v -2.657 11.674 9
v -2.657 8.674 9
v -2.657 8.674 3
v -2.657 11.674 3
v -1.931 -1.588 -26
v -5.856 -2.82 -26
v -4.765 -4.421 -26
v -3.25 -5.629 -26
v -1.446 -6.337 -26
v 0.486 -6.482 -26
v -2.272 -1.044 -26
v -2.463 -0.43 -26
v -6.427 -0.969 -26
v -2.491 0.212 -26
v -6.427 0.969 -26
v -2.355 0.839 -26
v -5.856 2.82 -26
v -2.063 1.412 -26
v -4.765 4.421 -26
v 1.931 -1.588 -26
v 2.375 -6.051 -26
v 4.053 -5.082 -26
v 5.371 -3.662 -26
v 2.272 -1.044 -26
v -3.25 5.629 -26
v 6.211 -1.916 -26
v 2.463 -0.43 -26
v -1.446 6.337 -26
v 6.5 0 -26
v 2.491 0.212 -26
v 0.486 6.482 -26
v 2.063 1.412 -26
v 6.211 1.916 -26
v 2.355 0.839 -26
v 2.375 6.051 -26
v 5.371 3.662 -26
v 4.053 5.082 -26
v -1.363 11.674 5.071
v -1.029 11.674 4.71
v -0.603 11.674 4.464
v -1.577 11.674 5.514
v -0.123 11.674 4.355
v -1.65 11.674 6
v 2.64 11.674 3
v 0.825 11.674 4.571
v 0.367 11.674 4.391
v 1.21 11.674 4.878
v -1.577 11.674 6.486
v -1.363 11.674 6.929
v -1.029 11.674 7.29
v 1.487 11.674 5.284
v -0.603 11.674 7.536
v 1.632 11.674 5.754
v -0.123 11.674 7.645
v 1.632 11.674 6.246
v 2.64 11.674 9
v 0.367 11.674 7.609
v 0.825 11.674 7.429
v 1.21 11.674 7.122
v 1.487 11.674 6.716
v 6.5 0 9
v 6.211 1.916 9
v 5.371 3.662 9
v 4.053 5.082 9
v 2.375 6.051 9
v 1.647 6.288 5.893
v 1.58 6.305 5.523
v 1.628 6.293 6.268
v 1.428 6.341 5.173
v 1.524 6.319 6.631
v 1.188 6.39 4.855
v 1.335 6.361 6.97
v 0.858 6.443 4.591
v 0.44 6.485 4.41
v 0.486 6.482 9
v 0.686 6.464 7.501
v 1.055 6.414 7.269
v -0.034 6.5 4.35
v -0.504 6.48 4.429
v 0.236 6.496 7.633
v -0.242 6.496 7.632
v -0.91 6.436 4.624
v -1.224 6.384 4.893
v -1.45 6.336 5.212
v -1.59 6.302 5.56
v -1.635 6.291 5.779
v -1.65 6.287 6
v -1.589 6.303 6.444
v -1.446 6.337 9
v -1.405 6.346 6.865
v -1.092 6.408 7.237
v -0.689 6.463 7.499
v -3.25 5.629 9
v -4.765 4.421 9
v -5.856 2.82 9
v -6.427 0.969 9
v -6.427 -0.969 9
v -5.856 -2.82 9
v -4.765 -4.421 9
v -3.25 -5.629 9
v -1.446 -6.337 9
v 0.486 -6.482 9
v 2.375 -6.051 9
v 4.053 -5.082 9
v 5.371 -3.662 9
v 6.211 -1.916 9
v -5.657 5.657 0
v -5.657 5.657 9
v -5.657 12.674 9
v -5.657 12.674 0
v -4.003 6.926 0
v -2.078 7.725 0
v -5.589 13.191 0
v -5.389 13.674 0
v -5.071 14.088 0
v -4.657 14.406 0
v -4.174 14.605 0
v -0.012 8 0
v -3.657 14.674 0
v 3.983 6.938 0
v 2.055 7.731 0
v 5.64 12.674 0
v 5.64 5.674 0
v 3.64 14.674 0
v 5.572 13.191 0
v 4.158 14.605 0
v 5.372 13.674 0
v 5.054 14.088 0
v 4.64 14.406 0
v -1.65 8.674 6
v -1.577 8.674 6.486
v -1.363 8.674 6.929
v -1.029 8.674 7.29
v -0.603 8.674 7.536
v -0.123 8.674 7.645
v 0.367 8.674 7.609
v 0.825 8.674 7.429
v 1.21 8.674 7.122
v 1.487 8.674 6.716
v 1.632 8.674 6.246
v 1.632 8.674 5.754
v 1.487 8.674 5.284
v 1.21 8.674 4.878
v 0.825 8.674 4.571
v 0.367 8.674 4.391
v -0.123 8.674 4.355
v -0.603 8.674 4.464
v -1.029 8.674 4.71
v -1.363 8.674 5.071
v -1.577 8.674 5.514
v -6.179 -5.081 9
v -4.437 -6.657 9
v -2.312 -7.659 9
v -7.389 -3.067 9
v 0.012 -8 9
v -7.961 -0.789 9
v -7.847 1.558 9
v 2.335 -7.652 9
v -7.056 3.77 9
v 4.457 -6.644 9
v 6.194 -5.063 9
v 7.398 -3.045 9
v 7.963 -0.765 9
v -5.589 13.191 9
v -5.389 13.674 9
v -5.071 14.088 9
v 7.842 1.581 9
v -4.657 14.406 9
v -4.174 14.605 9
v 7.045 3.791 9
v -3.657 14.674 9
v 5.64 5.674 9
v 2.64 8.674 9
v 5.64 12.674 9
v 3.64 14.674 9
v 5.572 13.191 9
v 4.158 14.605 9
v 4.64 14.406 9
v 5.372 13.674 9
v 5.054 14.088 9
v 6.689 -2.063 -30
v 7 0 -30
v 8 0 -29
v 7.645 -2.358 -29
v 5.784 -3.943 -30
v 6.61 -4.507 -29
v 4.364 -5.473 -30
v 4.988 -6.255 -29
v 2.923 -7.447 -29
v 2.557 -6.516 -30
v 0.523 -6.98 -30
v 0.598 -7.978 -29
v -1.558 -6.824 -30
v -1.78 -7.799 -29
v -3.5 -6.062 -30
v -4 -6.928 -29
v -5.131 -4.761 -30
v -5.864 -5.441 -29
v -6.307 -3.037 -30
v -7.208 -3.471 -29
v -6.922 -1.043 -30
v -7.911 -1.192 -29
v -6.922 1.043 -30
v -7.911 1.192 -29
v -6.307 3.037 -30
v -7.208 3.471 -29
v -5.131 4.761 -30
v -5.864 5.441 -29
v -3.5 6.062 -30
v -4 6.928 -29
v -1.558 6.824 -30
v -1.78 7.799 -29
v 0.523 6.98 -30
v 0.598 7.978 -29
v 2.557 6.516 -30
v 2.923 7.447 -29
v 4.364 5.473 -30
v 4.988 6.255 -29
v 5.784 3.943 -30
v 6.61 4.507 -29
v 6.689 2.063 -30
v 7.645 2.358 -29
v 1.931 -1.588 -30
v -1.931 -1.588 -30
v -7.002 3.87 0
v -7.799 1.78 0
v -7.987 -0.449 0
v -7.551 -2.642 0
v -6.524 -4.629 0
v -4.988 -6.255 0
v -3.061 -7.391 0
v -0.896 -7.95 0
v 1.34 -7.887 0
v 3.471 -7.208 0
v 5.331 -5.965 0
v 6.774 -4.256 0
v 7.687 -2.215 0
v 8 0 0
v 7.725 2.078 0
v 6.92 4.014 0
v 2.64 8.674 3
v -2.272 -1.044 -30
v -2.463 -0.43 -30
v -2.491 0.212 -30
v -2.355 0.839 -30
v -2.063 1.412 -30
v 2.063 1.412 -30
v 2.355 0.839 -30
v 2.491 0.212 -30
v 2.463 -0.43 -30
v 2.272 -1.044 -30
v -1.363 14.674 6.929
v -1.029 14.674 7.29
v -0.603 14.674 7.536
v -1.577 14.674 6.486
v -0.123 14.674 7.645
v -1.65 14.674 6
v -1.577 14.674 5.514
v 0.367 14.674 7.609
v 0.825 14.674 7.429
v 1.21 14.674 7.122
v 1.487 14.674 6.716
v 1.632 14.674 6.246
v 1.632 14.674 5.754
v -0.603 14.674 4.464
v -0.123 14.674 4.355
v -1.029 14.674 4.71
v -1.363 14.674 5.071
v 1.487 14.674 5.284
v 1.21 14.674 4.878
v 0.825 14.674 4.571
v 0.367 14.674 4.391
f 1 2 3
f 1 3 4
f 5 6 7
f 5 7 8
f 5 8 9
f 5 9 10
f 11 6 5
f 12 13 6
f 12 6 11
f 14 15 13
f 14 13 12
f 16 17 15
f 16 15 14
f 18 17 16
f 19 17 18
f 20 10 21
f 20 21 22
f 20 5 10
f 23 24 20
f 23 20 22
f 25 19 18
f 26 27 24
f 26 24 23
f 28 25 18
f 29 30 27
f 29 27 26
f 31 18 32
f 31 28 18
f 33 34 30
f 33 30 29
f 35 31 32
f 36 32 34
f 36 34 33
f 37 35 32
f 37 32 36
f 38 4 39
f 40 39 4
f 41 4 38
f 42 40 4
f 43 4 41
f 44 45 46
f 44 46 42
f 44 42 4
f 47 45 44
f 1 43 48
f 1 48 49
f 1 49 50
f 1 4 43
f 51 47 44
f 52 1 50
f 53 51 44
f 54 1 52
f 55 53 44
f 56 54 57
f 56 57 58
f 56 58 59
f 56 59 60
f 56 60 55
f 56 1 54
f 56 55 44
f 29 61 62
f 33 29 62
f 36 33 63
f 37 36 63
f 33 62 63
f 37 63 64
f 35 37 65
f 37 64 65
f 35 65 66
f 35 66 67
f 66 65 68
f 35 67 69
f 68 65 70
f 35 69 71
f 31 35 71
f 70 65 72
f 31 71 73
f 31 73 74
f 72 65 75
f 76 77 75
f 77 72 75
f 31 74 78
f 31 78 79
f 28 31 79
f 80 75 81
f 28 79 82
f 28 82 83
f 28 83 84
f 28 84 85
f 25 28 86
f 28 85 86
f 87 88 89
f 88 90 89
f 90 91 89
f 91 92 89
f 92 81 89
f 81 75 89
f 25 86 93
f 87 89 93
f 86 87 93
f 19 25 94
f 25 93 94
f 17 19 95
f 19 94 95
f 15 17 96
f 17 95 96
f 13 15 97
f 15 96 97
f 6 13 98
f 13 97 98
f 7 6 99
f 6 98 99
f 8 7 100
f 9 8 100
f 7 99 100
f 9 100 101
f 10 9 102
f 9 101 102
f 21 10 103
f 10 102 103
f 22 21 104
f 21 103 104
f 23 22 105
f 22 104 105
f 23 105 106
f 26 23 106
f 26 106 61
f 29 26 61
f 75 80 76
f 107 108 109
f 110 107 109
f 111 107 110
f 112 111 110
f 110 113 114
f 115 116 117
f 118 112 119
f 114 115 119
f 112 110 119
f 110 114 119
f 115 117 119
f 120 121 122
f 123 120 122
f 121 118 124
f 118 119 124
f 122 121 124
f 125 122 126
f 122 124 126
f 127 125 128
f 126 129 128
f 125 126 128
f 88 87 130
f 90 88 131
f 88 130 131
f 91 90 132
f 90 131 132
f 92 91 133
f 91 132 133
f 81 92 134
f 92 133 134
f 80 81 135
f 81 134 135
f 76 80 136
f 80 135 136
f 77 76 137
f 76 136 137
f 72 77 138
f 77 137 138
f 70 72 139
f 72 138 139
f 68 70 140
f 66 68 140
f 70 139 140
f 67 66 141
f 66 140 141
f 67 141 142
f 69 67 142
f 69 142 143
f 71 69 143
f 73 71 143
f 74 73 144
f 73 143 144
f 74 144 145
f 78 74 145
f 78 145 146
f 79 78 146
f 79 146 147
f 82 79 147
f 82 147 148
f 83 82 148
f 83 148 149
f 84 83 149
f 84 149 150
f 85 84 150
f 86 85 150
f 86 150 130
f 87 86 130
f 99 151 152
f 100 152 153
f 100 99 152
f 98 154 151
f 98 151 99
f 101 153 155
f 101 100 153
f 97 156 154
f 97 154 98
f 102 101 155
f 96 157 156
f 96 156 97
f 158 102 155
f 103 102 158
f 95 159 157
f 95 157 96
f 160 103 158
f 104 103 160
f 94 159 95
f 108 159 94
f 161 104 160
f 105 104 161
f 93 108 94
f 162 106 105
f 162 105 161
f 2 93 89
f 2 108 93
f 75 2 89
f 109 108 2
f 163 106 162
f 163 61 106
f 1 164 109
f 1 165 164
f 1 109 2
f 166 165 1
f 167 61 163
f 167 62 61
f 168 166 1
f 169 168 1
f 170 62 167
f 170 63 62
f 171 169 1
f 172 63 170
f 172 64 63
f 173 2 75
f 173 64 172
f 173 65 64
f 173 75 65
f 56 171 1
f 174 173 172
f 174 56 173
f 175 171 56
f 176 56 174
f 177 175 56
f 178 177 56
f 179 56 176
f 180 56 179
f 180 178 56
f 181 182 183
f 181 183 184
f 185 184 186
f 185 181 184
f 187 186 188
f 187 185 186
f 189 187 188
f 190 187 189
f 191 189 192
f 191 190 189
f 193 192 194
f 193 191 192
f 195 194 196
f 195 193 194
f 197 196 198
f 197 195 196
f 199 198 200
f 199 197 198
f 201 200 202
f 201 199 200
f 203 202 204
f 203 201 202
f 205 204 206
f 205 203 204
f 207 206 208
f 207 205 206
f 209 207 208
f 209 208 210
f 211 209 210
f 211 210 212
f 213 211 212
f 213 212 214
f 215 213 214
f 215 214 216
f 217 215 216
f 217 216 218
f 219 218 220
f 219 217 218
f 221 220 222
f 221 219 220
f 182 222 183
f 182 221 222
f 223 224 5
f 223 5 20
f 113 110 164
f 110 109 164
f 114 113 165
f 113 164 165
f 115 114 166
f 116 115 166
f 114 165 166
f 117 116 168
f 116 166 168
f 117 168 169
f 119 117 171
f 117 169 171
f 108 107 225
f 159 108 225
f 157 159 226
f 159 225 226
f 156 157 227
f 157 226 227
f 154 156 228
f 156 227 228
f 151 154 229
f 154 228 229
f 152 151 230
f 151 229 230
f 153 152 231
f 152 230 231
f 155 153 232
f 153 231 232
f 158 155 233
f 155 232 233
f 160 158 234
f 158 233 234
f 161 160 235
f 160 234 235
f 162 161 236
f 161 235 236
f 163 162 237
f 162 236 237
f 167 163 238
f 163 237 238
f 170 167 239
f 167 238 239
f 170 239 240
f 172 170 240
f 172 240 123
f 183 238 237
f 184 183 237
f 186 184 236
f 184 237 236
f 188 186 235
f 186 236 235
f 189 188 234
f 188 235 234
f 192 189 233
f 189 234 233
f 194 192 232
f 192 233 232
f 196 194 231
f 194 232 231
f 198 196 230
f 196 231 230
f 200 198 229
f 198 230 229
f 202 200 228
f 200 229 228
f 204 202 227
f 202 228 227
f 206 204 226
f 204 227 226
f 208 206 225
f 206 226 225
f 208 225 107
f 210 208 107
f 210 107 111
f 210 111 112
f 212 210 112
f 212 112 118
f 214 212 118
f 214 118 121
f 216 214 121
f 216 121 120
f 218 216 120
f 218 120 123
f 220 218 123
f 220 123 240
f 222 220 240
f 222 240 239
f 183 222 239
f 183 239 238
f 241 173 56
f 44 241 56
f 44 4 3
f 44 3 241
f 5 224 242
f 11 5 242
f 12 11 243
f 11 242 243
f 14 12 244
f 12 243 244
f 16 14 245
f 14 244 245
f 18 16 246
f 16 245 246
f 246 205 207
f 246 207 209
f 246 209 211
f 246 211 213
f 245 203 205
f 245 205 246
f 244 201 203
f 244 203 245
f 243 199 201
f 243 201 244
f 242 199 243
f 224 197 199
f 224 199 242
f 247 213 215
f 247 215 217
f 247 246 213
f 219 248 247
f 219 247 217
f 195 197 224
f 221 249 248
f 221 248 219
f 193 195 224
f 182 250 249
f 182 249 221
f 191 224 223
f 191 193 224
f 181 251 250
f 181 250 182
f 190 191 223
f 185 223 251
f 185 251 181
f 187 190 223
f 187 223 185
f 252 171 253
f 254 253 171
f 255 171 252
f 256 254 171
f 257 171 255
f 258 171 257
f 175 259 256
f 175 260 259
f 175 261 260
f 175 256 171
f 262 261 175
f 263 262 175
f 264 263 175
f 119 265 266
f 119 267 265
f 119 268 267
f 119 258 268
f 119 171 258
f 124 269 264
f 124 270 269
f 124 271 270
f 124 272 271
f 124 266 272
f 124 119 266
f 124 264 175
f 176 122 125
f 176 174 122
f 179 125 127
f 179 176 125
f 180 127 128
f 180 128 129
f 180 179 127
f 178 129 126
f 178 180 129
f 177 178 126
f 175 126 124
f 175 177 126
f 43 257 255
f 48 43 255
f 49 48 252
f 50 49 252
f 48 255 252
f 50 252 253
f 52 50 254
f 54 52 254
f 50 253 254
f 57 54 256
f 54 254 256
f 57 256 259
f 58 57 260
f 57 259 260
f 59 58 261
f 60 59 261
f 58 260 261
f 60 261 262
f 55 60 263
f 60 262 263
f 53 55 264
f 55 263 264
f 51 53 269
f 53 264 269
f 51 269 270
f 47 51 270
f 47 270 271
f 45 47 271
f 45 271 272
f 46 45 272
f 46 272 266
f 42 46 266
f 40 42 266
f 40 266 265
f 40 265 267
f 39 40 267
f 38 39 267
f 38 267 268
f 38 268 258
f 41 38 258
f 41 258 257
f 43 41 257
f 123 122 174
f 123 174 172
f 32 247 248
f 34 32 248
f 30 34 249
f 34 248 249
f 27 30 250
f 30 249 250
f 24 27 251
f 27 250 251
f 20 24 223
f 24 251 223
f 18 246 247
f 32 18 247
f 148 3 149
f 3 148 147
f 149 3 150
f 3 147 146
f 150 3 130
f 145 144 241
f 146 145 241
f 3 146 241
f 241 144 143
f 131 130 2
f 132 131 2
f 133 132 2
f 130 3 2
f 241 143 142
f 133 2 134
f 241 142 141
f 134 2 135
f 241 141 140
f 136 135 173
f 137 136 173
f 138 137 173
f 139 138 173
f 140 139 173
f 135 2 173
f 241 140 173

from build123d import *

# Parameters (mm, degrees)
PAD_DEPTH       = 9
SKETCH001_R     = 8
PAD001_DEPTH    = 30
SKETCH002_R     = 6.5
POCKET_DEPTH    = 35
POCKET001_DEPTH = 5
CHAMFER_SIZE    = 1
FILLET_R        = 2
SKETCH004_W     = 5.296944
SKETCH004_H     = 3
POCKET002_DEPTH = 6
SKETCH005_R     = 1.65
HOLE_DEPTH      = 14.00858
HOLE_TIPS_R     = 1.65


with BuildPart() as part:
    # Sketch → Pad (new body)
    with BuildSketch(Plane.XY):
        with BuildLine():
            ThreePointArc((-5.656854, 5.656854), (0.011836, -7.999991), (5.64009, 5.673569))
            Line((5.64009, 14.673569), (5.64009, 5.673569))
            Line((-5.656854, 14.673569), (5.64009, 14.673569))
            Line((-5.656854, 5.656854), (-5.656854, 14.673569))
        make_face()
    extrude(amount=PAD_DEPTH)

    # Sketch001 (on Face5 of Pad) → Pad001 (join)
    with BuildSketch(Plane(origin=(0, 0, 0), x_dir=(1, 0, 0), z_dir=(0, 0, -1))):
        Circle(SKETCH001_R)
    extrude(amount=PAD001_DEPTH)

    # Sketch002 (on Face5 of Pad001) → Pocket (cut)
    with BuildSketch(Plane.XY.offset(9)):
        Circle(SKETCH002_R)
    extrude(amount=-POCKET_DEPTH, mode=Mode.SUBTRACT)

    # Sketch003 (on Face8 of Pocket) → Pocket001 (cut)
    with BuildSketch(Plane(origin=(0, 0, -30), x_dir=(1, 0, 0), z_dir=(0, 0, -1))):
        with BuildLine():
            Line((-1.930765, 1.588126), (1.930765, 1.588126))
            ThreePointArc((2.063156, -1.411874), (2.497569, 0.110218), (1.930765, 1.588126))
            Line((-2.063156, -1.411874), (2.063156, -1.411874))
            ThreePointArc((-1.930765, 1.588126), (-2.497569, 0.110218), (-2.063156, -1.411874))
        make_face()
    extrude(amount=-POCKET001_DEPTH, mode=Mode.SUBTRACT)

    # Chamfer
    chamfer_edges = [part.edges().sort_by_distance(p)[0] for p in [
        (-8, 0, -30),
    ]]
    chamfer(chamfer_edges, length=CHAMFER_SIZE)

    # Fillet
    fillet_edges = [part.edges().sort_by_distance(p)[0] for p in [
        (5.64009, 14.673569, 4.5),
        (-5.656854, 14.673569, 4.5),
    ]]
    fillet(fillet_edges, radius=FILLET_R)

    # Sketch004 (on Face9 of Fillet) → Pocket002 (cut)
    with BuildSketch(Plane.XY.offset(9)):
        with Locations((-0.008382, 10.173569)):
            Rectangle(SKETCH004_W, SKETCH004_H)
    extrude(amount=-POCKET002_DEPTH, mode=Mode.SUBTRACT)

    # Sketch005 (on Face5 of Pocket002) → Hole (cut)
    with BuildSketch(Plane(origin=(0, 14.673569, 0), x_dir=(-1, 0, 0), z_dir=(0, 1, 0))):
        with Locations((0, 6)):
            Circle(SKETCH005_R)
    extrude(amount=-HOLE_DEPTH, mode=Mode.SUBTRACT)

    # Hole tips → Hole tip 1 section 0
    with BuildSketch(Plane(origin=(0, 0.664989, 0), x_dir=(-1, 0, 0), z_dir=(0, 1, 0)), mode=Mode.PRIVATE) as hole_tip_1_s0:
        with Locations((0, 6)):
            Circle(HOLE_TIPS_R)
    loft([hole_tip_1_s0.sketch, Vertex(0, -0.326431, 6)], mode=Mode.SUBTRACT)


solid = part.part
